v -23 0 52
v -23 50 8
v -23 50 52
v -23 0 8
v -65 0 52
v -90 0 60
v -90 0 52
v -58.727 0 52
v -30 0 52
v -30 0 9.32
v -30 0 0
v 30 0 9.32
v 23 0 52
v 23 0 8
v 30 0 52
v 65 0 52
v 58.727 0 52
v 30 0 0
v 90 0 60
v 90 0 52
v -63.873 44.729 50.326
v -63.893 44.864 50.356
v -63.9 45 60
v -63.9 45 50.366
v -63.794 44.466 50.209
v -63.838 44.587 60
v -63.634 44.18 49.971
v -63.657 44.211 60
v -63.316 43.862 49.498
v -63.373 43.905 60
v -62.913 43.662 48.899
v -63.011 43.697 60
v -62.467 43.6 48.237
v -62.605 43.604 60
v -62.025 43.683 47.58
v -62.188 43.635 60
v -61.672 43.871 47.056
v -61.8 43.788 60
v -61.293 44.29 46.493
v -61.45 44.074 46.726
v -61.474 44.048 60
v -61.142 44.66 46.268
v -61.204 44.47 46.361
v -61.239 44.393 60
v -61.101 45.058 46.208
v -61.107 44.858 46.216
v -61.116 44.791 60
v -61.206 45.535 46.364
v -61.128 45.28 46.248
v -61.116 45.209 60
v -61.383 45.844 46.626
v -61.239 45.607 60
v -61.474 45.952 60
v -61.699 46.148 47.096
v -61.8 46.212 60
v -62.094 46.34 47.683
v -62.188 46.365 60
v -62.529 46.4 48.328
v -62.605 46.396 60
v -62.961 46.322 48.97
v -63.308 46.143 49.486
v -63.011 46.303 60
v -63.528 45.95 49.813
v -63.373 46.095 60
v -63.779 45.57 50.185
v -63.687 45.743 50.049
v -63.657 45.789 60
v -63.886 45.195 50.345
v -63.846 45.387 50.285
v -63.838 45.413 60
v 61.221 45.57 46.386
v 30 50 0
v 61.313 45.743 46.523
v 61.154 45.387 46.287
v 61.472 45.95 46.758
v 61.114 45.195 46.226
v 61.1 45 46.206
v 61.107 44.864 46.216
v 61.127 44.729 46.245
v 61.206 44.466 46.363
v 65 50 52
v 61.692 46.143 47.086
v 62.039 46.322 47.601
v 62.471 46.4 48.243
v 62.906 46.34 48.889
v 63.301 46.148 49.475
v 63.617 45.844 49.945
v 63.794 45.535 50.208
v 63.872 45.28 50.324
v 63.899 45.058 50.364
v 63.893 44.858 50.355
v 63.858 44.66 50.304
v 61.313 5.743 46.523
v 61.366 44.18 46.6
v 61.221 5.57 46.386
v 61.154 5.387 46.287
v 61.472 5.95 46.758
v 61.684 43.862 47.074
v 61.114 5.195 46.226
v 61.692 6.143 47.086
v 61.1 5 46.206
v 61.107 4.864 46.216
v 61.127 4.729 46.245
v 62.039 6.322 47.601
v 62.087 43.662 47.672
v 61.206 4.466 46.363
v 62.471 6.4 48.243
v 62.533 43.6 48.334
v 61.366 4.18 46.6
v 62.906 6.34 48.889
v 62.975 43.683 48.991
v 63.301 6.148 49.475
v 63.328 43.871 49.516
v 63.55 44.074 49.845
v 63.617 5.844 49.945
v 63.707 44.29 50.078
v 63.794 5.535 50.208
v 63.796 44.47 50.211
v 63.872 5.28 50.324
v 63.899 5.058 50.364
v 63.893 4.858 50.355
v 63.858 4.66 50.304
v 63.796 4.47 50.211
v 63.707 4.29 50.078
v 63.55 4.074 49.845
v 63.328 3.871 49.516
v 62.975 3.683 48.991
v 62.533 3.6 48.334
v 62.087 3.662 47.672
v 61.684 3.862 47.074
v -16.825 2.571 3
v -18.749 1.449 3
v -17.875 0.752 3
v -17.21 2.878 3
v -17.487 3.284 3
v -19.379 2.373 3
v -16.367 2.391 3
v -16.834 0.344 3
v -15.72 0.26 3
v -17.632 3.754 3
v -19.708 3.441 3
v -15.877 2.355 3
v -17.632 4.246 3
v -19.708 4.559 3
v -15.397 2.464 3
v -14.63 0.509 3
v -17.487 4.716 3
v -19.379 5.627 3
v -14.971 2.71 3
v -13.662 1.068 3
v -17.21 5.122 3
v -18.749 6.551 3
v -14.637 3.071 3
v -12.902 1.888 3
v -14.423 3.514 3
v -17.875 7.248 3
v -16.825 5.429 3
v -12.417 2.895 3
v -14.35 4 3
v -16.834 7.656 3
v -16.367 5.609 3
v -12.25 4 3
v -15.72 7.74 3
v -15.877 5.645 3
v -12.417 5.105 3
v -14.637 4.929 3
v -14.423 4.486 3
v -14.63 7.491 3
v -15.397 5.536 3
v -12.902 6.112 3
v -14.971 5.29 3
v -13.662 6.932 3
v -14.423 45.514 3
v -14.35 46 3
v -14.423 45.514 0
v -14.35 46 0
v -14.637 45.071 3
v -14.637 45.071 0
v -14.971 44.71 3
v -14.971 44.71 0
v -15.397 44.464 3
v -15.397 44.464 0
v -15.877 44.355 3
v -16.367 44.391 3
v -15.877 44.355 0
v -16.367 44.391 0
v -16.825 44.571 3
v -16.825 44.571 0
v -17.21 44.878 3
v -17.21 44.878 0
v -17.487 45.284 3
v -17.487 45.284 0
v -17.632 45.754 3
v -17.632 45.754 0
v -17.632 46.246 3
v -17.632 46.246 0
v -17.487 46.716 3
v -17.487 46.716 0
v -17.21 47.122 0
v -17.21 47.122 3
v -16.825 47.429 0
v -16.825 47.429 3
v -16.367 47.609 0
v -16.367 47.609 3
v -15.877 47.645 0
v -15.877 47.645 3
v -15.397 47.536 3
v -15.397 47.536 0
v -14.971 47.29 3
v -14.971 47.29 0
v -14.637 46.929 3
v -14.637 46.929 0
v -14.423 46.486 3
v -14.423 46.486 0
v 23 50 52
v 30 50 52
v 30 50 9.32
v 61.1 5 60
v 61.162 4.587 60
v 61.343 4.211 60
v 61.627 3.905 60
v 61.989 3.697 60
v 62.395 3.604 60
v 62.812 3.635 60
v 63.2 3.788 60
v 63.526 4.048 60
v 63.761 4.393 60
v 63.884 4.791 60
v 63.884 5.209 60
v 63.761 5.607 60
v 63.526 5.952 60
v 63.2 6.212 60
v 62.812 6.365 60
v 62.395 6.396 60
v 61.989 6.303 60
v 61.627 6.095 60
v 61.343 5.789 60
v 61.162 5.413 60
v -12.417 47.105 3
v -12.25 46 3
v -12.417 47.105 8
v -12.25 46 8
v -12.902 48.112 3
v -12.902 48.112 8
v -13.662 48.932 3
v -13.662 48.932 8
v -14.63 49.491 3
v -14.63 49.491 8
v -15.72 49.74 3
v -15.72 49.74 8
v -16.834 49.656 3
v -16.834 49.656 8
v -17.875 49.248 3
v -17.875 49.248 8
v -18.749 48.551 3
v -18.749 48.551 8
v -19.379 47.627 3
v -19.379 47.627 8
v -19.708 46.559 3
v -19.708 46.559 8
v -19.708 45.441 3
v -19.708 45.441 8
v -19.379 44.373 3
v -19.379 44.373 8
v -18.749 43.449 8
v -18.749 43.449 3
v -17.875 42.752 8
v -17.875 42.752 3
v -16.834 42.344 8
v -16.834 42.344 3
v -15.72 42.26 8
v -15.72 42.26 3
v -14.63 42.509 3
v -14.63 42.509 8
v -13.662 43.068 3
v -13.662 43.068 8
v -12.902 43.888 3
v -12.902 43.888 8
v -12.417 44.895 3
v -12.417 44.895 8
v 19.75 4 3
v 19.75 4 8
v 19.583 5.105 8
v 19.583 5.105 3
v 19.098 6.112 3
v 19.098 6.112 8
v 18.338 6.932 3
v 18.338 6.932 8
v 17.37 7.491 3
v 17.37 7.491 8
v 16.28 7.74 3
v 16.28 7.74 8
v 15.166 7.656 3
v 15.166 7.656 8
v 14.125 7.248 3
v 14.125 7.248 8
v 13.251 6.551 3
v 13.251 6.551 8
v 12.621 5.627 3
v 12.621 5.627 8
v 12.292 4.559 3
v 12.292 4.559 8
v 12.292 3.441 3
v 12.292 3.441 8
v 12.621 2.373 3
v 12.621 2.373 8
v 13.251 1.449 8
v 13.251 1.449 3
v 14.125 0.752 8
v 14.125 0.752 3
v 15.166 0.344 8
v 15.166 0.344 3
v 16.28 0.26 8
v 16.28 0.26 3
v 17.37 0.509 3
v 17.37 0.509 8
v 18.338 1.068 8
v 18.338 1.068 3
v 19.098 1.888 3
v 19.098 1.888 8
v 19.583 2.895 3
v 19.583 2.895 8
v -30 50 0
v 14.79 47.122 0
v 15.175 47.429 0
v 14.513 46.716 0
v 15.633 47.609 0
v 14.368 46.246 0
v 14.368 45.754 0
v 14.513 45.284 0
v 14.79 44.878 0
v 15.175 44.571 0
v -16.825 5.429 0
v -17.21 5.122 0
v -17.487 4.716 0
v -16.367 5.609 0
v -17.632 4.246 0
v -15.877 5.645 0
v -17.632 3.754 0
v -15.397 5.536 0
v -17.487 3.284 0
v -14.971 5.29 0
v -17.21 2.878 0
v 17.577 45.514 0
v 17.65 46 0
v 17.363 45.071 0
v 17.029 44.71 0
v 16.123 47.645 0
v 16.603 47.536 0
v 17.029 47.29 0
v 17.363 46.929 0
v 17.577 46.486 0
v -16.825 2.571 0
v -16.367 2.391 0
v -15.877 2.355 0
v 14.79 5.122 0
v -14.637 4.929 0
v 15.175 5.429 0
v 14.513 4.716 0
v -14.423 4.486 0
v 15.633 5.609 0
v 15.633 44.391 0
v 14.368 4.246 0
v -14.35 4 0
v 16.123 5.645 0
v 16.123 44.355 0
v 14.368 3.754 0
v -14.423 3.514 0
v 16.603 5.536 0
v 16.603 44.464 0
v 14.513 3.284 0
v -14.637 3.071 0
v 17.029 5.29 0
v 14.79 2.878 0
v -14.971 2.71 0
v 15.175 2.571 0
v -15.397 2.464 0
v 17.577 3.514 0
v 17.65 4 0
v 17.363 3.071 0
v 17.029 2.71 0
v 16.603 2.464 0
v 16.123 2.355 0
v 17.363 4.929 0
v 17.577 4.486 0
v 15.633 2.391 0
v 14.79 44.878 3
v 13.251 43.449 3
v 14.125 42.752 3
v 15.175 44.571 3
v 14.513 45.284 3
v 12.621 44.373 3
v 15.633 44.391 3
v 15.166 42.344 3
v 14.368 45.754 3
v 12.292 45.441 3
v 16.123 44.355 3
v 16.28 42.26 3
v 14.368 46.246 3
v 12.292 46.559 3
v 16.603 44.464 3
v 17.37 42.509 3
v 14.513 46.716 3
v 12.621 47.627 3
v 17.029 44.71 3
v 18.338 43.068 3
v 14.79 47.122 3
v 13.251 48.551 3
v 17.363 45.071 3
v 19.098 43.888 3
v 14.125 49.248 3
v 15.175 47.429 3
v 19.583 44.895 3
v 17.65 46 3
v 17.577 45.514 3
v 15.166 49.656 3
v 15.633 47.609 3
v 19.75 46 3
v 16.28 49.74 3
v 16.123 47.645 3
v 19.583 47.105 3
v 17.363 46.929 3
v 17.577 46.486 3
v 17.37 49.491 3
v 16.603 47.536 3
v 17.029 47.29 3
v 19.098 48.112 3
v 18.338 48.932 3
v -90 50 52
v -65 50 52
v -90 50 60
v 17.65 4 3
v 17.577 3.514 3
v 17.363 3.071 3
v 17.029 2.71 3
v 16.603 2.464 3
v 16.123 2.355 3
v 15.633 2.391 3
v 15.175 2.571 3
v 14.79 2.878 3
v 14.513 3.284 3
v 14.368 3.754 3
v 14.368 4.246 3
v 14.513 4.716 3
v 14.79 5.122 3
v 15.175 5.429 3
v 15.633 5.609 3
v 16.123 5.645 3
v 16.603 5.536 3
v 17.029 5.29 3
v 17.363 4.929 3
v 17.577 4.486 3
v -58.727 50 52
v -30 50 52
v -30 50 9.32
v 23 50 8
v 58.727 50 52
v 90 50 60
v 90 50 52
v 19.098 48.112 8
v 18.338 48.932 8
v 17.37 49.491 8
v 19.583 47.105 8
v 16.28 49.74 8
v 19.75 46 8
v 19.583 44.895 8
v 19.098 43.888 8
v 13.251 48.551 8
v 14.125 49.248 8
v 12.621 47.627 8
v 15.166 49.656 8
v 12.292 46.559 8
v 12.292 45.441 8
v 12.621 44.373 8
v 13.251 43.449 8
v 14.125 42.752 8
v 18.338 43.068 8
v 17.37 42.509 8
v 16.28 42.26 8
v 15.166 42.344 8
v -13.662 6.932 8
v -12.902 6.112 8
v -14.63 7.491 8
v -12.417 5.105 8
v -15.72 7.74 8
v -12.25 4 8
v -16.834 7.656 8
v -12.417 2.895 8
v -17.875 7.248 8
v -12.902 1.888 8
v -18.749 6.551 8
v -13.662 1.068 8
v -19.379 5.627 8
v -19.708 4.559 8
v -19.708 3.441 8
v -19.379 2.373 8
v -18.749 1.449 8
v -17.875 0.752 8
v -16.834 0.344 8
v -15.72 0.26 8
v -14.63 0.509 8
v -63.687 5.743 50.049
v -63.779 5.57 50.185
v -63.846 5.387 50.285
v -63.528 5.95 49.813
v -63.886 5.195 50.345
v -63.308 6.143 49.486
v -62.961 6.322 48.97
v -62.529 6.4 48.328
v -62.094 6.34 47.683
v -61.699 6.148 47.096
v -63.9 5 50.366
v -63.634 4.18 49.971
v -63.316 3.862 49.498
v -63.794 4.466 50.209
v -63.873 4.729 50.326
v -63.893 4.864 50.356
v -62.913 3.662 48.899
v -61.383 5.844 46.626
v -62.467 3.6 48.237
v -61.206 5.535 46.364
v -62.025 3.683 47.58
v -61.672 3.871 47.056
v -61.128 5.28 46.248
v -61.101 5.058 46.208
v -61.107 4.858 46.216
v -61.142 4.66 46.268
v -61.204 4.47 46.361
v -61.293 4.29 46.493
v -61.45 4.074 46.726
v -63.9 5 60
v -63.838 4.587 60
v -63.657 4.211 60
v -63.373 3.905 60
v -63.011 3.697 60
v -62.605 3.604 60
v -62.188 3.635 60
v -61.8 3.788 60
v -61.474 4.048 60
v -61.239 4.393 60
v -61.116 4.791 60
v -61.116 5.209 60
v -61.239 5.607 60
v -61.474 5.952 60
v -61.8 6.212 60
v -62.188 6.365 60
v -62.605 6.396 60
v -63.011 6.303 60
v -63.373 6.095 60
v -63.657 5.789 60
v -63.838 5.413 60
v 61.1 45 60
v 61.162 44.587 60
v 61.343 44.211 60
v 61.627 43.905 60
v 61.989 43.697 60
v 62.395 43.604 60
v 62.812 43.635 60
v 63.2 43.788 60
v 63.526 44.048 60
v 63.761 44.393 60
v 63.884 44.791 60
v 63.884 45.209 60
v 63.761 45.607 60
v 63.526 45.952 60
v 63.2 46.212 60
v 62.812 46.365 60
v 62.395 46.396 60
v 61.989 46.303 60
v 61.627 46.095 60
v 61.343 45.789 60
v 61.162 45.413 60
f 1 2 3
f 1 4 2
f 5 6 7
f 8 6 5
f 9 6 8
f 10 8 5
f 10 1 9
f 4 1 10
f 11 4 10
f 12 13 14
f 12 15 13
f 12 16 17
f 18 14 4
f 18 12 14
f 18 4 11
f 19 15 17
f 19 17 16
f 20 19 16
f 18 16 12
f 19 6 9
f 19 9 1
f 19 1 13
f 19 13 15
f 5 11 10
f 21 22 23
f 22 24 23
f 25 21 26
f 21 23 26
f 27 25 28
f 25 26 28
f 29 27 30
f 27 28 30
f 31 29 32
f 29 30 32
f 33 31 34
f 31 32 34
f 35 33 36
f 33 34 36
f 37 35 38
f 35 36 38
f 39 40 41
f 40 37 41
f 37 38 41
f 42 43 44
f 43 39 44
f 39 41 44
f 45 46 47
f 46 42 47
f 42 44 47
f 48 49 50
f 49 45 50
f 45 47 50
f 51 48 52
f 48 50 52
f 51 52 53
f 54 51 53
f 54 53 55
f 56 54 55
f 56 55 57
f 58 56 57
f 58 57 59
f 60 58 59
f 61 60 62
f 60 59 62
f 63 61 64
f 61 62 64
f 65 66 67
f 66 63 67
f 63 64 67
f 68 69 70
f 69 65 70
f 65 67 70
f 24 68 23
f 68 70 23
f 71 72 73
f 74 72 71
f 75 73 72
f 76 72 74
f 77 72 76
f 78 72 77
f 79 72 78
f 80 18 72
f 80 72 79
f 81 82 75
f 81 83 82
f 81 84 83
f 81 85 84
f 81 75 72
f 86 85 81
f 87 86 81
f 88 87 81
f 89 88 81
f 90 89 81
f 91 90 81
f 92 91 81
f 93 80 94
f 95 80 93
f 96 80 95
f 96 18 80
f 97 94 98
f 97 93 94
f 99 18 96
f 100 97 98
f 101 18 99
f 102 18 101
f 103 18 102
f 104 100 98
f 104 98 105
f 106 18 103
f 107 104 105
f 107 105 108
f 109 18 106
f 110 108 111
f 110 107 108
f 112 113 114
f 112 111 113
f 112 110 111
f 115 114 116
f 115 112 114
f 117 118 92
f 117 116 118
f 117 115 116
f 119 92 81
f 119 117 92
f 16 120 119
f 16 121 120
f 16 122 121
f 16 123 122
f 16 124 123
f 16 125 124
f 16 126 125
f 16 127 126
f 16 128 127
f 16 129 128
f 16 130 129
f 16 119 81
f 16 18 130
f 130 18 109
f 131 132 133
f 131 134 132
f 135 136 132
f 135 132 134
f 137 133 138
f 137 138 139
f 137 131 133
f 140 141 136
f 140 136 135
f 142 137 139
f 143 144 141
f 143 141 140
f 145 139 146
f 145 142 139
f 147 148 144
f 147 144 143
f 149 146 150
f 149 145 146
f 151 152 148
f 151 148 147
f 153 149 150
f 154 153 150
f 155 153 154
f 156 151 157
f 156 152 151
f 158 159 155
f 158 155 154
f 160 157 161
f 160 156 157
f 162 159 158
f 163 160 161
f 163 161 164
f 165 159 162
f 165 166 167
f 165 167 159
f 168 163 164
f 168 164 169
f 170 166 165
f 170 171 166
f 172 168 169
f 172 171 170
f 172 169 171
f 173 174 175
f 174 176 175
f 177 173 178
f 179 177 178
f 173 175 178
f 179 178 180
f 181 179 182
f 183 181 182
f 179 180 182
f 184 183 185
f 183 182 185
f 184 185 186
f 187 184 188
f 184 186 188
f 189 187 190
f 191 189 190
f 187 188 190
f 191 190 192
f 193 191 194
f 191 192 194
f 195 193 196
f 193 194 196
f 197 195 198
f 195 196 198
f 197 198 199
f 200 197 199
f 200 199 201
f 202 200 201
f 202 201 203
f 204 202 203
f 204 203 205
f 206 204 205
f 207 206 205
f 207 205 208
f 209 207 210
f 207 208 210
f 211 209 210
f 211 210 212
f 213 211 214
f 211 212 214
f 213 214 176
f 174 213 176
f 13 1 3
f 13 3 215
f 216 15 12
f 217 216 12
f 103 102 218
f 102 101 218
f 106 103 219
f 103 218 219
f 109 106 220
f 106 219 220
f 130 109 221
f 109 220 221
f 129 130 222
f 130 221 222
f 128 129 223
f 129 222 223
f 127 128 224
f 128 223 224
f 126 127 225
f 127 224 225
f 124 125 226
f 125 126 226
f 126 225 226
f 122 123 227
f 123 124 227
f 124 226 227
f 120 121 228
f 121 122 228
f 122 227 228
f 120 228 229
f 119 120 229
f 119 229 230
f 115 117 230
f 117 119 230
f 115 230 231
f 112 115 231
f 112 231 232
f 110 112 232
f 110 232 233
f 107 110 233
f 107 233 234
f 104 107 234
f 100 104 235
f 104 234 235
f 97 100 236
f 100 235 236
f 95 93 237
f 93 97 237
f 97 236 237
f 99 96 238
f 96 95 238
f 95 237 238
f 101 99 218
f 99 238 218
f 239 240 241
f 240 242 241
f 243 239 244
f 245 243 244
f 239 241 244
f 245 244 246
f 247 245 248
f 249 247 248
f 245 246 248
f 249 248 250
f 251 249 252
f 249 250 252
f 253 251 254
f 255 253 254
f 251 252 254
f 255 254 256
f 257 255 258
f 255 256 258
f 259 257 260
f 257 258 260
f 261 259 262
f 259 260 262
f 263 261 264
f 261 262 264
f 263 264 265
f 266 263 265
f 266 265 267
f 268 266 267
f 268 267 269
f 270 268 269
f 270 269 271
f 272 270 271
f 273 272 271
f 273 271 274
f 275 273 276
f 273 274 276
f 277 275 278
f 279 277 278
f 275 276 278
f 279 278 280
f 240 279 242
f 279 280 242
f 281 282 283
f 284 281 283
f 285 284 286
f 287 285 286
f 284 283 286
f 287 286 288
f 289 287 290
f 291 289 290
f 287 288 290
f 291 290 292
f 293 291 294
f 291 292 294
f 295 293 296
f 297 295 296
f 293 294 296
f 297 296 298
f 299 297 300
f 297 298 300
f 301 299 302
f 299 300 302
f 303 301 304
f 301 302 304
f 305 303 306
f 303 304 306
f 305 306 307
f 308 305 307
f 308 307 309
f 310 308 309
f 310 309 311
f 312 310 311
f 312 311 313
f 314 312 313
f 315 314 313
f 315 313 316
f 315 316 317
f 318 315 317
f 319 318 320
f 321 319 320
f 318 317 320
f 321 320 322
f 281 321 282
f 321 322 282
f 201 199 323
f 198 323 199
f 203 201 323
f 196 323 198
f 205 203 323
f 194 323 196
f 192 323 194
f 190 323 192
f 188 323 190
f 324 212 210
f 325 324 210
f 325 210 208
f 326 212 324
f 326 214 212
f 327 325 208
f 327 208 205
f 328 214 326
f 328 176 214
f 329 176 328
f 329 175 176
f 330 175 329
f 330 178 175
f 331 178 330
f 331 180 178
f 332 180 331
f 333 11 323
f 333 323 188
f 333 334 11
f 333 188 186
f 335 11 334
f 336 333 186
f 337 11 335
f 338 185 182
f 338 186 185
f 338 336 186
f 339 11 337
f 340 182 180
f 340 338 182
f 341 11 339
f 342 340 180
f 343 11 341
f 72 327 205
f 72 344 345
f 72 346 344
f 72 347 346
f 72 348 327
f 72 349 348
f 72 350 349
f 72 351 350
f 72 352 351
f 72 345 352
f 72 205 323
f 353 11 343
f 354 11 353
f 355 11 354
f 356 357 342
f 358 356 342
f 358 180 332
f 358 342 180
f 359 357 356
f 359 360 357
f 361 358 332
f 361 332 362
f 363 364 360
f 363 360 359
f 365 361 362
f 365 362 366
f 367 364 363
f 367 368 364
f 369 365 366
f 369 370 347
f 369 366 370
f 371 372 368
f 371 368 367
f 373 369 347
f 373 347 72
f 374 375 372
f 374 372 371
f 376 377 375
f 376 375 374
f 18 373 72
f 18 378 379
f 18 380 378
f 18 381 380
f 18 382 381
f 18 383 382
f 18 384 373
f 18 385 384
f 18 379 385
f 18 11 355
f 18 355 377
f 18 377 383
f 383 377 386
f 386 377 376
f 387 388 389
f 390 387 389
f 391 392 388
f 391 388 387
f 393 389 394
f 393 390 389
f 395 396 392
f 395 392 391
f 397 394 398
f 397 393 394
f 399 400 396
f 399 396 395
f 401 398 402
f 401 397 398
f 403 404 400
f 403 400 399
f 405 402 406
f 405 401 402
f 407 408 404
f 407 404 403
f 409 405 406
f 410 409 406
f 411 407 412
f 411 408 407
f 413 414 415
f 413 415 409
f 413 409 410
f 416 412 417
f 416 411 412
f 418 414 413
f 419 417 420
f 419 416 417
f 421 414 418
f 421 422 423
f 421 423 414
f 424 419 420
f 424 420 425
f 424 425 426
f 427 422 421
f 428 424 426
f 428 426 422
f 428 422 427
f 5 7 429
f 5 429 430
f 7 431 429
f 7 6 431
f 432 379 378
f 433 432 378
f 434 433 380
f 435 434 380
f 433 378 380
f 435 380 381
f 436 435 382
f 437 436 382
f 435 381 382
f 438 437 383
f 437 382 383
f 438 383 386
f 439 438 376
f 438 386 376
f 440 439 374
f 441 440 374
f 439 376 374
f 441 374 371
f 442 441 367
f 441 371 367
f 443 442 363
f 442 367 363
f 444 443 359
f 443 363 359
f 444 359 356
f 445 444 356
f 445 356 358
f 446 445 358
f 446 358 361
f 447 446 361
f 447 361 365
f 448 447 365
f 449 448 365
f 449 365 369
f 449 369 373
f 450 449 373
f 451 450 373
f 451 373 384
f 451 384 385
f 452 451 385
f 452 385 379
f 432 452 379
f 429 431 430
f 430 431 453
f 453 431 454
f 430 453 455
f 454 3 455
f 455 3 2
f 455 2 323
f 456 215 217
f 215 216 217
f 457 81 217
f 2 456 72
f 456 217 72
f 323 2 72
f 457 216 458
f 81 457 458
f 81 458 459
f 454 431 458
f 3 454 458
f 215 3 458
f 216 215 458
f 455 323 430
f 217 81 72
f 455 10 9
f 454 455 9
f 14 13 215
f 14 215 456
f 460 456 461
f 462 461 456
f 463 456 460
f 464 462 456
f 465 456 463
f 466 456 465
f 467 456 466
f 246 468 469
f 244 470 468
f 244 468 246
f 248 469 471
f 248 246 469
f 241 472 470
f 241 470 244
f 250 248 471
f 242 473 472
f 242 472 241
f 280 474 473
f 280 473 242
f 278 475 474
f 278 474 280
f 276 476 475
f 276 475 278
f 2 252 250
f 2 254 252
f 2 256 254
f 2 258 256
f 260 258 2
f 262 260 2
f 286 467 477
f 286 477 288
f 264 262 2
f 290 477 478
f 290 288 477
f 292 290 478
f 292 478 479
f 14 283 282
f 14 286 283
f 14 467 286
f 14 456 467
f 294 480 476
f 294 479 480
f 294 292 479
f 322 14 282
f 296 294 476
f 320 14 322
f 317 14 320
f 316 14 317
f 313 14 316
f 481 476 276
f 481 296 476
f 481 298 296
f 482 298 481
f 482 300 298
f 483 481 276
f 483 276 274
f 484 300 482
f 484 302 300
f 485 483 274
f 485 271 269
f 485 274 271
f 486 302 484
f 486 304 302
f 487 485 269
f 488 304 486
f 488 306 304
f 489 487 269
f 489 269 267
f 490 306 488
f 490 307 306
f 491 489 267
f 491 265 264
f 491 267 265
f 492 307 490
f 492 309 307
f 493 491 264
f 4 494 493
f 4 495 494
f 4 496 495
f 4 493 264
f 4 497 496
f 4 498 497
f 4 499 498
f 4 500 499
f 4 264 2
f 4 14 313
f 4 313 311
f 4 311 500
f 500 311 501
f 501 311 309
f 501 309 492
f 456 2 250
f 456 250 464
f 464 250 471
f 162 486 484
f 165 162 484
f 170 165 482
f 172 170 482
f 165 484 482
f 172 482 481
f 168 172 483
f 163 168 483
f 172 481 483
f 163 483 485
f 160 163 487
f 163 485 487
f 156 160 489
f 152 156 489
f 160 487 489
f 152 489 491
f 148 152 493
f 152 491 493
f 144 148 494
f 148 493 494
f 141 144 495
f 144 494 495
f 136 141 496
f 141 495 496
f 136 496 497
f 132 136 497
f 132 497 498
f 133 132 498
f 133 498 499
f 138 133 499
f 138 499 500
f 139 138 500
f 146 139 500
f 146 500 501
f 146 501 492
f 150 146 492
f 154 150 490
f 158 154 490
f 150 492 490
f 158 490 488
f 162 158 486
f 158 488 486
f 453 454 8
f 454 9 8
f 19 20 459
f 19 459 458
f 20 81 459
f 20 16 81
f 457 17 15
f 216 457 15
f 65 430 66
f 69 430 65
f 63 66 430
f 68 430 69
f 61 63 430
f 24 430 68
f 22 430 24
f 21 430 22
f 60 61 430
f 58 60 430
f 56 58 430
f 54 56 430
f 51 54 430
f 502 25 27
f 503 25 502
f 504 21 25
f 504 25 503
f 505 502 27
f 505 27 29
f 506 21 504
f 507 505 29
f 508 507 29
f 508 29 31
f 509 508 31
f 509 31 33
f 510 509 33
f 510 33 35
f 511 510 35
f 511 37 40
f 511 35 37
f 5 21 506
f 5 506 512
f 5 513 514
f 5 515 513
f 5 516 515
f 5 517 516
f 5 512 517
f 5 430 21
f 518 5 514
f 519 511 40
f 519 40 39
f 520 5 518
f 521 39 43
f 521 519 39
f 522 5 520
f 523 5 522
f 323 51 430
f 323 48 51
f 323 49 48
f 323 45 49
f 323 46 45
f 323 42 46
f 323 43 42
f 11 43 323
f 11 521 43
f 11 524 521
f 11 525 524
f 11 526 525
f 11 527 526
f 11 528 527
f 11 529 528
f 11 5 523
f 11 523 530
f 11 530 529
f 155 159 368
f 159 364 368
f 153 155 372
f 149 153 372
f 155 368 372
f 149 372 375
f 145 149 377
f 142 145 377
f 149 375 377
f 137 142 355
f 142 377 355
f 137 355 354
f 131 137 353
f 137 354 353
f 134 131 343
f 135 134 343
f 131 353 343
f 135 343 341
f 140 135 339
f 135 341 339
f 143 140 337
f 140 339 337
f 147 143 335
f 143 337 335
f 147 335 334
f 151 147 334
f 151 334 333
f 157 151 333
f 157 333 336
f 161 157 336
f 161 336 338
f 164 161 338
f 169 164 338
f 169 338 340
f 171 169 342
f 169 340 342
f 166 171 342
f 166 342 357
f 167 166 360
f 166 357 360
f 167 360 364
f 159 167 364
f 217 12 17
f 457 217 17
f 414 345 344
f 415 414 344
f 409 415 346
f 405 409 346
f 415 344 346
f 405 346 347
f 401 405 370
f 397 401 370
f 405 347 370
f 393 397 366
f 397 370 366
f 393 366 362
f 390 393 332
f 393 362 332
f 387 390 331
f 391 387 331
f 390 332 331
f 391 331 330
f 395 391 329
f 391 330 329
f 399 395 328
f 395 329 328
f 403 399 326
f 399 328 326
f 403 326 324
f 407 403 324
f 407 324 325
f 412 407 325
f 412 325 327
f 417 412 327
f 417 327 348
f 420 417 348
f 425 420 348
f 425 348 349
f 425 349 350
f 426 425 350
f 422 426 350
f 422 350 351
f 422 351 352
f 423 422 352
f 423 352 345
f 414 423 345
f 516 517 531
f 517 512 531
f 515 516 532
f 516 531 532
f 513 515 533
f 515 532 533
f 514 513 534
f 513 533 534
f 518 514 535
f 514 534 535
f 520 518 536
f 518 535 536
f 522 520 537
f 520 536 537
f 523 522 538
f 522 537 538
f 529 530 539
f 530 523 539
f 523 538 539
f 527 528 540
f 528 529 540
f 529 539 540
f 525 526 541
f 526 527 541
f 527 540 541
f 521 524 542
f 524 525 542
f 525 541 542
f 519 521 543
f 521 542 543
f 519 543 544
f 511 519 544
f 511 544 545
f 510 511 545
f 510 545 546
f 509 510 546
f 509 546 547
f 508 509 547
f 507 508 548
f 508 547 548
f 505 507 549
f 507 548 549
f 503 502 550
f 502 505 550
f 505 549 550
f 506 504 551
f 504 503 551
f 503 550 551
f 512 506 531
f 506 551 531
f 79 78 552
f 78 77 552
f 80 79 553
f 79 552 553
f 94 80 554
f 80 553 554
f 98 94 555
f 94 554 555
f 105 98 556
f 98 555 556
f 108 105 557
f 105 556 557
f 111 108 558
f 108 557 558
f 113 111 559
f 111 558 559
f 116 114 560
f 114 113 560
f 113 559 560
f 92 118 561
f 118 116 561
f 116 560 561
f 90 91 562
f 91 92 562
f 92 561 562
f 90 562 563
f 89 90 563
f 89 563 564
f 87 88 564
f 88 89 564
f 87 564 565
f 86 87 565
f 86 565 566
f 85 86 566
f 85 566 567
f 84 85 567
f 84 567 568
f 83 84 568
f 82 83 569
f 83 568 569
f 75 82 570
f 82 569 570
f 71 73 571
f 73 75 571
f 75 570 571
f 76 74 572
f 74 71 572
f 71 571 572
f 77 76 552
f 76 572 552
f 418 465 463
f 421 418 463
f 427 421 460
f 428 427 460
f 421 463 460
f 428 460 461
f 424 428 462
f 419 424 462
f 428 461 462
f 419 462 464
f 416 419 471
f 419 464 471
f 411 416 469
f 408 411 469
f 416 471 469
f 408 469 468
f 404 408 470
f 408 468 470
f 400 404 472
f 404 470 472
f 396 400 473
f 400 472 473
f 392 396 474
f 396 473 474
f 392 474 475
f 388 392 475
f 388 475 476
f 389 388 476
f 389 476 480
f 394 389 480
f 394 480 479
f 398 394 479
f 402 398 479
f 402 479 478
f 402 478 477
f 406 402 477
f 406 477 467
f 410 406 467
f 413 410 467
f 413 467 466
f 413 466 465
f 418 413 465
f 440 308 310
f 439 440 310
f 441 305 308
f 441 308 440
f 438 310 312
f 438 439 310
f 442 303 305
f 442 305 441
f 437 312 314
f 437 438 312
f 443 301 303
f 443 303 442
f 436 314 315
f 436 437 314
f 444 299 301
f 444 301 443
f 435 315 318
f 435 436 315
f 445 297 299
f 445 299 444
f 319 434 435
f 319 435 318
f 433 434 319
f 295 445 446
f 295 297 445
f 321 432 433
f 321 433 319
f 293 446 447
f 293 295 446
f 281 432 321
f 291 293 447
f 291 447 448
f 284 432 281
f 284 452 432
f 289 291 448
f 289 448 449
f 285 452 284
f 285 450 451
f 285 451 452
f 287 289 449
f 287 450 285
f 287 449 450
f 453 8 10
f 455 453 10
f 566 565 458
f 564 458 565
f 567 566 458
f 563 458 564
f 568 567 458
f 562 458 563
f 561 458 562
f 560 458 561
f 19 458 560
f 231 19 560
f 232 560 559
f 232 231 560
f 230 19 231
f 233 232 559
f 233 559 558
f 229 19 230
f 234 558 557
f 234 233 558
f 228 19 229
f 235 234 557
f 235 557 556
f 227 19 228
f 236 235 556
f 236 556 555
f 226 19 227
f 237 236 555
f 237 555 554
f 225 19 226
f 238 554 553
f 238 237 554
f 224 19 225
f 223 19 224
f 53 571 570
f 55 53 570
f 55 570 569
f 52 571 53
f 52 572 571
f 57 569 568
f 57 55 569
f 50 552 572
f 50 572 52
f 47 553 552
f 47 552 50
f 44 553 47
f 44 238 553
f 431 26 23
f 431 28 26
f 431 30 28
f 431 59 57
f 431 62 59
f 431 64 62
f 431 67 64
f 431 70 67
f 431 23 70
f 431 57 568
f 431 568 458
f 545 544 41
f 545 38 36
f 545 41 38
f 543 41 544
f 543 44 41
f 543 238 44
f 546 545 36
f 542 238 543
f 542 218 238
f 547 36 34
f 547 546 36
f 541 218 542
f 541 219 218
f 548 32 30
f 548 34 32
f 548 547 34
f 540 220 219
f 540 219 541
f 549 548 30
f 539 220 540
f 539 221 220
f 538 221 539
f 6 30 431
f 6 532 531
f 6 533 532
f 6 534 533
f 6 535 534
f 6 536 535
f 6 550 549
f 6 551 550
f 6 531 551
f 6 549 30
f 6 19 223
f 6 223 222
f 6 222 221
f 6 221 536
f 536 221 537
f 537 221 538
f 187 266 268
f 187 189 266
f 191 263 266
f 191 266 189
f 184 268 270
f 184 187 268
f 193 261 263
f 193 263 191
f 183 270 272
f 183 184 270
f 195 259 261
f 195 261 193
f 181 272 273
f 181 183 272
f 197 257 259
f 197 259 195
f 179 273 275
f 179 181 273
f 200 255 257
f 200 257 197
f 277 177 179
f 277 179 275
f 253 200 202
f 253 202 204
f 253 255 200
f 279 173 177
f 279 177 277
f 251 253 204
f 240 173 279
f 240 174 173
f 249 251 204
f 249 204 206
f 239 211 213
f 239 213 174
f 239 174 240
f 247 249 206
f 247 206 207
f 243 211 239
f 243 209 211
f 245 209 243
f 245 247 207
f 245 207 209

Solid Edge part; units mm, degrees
sketch "Sketch1" plane through (0, 0, 0) normal (0, -1, 0) x (1, 0, 0)
  line L0 (30, 0) -> (65, 52)
  line L1 (65, 52) -> (90, 52)
  line L2 (90, 52) -> (90, 60)
  line L3 (90, 60) -> (56.9204, 60)
  line L4 (56.9204, 60) -> (0, 60)
  line L5 (0, 60) -> (0, 52)
  line L6 (0, 52) -> (23, 52)
  line L7 (23, 52) -> (23, 8)
  line L8 (23, 8) -> (0, 8)
  line L9 (0, 8) -> (0, 0)
  line L10 (0, 0) -> (30, 0)
  dimension "D1" = 8
  dimension "D2" = 30
  dimension "D3" = 23
  dimension "D4" = 8
  dimension "D5" = 60
  dimension "D6" = 65
extrude "Protrusion1" add sketch "Sketch1" against normal blind 50
mirror "Mirror1" about plane through (0, 25, 4) normal (-1, 0, 0) of "Protrusion1"
sketch "Sketch2" plane through (0, 0, 26) normal (0, -1, 0) x (1, 0, 0)
  line L0 (30, -16.6796) -> (58.7267, 26)
  line L1 (58.7267, 26) -> (30, 26)
  line L2 (30, 26) -> (30, -16.6796)
extrude "Cutout1" cut sketch "Sketch2" against normal through all
sketch "Sketch3" plane through (0, 25, 0) normal (0, 0, -1) x (1, 0, 0)
  circle A0 centre (-16, 21) radius 1.65
  circle A1 centre (16, 21) radius 1.65
  circle A2 centre (16, -21) radius 1.65
  circle A3 centre (-16, -21) radius 1.65
  dimension "D1" = 3.3
  dimension "D2" = 32
  dimension "D3" = 42
extrude "Cutout2" cut sketch "Sketch3" against normal up to next
sketch "Sketch4" plane through (0, 25, 8) normal (0, 0, 1) x (1, 0, 0)
  circle A0 centre (-16, -21) radius 3.75
  circle A1 centre (16, -21) radius 3.75
  circle A2 centre (-16, 21) radius 3.75
  circle A3 centre (16, 21) radius 3.75
  dimension "D1" = 7.5
extrude "Extrusionsausschnitt_4" cut sketch "Sketch4" against normal blind 5
sketch "Sketch5" plane through (0, 25, 60) normal (0, 0, 1) x (-1, 0, 0)
  circle A0 centre (-62.5, 20) radius 1.4
  circle A1 centre (-62.5, -20) radius 1.4
  circle A2 centre (62.5, -20) radius 1.4
  circle A3 centre (62.5, 20) radius 1.4
  dimension "D1" = 125
  dimension "D2" = 40
  dimension "D3" = 2.8
extrude "Cutout3" cut sketch "Sketch5" against normal through all
mirror "Mirror2" about plane through (0, 0, 0) normal (1, 0, 0) of "Cutout1"
properties material "Nylon, allgemein"
